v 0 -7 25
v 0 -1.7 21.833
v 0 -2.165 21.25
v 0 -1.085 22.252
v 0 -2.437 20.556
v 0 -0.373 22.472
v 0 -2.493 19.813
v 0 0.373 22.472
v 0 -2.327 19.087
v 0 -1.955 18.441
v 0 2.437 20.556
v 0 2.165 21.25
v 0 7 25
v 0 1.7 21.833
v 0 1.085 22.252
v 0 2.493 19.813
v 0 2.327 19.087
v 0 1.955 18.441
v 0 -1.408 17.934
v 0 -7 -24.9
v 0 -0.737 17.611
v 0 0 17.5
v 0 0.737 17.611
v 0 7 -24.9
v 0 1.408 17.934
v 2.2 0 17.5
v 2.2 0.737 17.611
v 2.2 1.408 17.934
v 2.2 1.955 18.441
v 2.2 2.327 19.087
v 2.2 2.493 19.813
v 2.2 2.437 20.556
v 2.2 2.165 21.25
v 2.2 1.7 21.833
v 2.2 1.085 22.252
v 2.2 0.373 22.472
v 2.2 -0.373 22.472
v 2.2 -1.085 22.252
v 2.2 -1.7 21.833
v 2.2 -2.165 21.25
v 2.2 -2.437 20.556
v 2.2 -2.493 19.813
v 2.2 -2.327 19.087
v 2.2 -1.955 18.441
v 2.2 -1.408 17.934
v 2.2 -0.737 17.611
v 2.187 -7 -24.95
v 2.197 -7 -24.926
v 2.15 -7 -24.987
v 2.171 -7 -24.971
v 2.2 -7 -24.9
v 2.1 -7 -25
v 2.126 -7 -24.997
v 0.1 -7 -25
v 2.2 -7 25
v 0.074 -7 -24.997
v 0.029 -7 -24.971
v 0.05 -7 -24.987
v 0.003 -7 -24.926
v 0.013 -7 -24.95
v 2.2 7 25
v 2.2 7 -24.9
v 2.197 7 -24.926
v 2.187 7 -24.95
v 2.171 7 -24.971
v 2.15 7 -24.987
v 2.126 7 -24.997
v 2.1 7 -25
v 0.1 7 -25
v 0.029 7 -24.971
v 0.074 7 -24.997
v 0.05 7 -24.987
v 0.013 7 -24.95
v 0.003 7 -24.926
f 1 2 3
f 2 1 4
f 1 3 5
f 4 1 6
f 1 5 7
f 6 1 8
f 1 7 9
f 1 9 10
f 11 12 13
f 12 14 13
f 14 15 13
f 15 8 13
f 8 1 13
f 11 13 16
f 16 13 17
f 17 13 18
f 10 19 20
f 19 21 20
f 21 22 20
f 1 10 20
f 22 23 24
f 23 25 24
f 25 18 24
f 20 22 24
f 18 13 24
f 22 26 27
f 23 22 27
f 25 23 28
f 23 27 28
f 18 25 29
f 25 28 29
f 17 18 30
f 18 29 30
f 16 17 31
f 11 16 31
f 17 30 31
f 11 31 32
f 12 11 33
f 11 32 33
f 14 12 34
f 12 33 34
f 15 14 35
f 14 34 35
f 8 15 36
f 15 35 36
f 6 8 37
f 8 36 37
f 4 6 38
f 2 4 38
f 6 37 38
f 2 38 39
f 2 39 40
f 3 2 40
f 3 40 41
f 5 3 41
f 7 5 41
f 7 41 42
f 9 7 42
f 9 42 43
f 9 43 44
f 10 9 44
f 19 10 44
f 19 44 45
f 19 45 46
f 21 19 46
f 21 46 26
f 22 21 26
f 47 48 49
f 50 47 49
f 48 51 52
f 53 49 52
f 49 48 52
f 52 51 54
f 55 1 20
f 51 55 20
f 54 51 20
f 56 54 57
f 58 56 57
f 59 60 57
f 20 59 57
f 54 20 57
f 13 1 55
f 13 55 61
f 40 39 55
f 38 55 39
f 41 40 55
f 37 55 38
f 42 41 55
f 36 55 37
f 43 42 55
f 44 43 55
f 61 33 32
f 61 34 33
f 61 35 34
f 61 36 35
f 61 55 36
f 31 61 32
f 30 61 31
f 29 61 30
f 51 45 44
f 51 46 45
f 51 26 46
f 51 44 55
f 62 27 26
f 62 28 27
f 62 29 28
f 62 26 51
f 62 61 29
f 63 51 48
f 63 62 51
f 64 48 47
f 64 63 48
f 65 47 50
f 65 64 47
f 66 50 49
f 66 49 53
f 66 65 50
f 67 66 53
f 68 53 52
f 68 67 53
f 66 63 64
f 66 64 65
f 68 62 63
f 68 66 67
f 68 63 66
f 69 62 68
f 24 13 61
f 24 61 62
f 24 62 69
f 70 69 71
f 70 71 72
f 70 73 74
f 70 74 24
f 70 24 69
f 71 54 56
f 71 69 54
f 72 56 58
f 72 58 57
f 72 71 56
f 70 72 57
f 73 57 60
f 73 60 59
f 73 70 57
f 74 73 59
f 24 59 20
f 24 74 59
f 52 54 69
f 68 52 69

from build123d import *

# Parameters (mm, degrees)
SKETCH1_W           = 50
SKETCH1_H           = 14
BOSS_EXTRUDE1_DEPTH = 2.2
SKETCH2_R           = 2.5
CUT_EXTRUDE1_DEPTH  = 27.054558142
FILLET1_R           = 0.1
FILLET2_R           = 0.1


with BuildPart() as part:
    # Sketch1 → Boss-Extrude1 (new body)
    with BuildSketch(Plane(origin=(0, 0, 0), x_dir=(0, 0, -1), z_dir=(1, 0, 0))):
        Rectangle(SKETCH1_W, SKETCH1_H)
    extrude(amount=BOSS_EXTRUDE1_DEPTH)

    # Sketch2 → Cut-Extrude1 (cut, through all)
    with BuildSketch(Plane(origin=(2.2, 0, 0), x_dir=(0, 0, -1), z_dir=(1, 0, 0))):
        with Locations((-20, 0)):
            Circle(SKETCH2_R)
    extrude(amount=-CUT_EXTRUDE1_DEPTH, mode=Mode.SUBTRACT)

    # Fillet1
    fillet1_edges = [part.edges().sort_by_distance(p)[0] for p in [
        (2.2, 0, -25),
    ]]
    fillet(fillet1_edges, radius=FILLET1_R)

    # Fillet2
    fillet2_edges = [part.edges().sort_by_distance(p)[0] for p in [
        (0, 0, -25),
    ]]
    fillet(fillet2_edges, radius=FILLET2_R)


solid = part.part
